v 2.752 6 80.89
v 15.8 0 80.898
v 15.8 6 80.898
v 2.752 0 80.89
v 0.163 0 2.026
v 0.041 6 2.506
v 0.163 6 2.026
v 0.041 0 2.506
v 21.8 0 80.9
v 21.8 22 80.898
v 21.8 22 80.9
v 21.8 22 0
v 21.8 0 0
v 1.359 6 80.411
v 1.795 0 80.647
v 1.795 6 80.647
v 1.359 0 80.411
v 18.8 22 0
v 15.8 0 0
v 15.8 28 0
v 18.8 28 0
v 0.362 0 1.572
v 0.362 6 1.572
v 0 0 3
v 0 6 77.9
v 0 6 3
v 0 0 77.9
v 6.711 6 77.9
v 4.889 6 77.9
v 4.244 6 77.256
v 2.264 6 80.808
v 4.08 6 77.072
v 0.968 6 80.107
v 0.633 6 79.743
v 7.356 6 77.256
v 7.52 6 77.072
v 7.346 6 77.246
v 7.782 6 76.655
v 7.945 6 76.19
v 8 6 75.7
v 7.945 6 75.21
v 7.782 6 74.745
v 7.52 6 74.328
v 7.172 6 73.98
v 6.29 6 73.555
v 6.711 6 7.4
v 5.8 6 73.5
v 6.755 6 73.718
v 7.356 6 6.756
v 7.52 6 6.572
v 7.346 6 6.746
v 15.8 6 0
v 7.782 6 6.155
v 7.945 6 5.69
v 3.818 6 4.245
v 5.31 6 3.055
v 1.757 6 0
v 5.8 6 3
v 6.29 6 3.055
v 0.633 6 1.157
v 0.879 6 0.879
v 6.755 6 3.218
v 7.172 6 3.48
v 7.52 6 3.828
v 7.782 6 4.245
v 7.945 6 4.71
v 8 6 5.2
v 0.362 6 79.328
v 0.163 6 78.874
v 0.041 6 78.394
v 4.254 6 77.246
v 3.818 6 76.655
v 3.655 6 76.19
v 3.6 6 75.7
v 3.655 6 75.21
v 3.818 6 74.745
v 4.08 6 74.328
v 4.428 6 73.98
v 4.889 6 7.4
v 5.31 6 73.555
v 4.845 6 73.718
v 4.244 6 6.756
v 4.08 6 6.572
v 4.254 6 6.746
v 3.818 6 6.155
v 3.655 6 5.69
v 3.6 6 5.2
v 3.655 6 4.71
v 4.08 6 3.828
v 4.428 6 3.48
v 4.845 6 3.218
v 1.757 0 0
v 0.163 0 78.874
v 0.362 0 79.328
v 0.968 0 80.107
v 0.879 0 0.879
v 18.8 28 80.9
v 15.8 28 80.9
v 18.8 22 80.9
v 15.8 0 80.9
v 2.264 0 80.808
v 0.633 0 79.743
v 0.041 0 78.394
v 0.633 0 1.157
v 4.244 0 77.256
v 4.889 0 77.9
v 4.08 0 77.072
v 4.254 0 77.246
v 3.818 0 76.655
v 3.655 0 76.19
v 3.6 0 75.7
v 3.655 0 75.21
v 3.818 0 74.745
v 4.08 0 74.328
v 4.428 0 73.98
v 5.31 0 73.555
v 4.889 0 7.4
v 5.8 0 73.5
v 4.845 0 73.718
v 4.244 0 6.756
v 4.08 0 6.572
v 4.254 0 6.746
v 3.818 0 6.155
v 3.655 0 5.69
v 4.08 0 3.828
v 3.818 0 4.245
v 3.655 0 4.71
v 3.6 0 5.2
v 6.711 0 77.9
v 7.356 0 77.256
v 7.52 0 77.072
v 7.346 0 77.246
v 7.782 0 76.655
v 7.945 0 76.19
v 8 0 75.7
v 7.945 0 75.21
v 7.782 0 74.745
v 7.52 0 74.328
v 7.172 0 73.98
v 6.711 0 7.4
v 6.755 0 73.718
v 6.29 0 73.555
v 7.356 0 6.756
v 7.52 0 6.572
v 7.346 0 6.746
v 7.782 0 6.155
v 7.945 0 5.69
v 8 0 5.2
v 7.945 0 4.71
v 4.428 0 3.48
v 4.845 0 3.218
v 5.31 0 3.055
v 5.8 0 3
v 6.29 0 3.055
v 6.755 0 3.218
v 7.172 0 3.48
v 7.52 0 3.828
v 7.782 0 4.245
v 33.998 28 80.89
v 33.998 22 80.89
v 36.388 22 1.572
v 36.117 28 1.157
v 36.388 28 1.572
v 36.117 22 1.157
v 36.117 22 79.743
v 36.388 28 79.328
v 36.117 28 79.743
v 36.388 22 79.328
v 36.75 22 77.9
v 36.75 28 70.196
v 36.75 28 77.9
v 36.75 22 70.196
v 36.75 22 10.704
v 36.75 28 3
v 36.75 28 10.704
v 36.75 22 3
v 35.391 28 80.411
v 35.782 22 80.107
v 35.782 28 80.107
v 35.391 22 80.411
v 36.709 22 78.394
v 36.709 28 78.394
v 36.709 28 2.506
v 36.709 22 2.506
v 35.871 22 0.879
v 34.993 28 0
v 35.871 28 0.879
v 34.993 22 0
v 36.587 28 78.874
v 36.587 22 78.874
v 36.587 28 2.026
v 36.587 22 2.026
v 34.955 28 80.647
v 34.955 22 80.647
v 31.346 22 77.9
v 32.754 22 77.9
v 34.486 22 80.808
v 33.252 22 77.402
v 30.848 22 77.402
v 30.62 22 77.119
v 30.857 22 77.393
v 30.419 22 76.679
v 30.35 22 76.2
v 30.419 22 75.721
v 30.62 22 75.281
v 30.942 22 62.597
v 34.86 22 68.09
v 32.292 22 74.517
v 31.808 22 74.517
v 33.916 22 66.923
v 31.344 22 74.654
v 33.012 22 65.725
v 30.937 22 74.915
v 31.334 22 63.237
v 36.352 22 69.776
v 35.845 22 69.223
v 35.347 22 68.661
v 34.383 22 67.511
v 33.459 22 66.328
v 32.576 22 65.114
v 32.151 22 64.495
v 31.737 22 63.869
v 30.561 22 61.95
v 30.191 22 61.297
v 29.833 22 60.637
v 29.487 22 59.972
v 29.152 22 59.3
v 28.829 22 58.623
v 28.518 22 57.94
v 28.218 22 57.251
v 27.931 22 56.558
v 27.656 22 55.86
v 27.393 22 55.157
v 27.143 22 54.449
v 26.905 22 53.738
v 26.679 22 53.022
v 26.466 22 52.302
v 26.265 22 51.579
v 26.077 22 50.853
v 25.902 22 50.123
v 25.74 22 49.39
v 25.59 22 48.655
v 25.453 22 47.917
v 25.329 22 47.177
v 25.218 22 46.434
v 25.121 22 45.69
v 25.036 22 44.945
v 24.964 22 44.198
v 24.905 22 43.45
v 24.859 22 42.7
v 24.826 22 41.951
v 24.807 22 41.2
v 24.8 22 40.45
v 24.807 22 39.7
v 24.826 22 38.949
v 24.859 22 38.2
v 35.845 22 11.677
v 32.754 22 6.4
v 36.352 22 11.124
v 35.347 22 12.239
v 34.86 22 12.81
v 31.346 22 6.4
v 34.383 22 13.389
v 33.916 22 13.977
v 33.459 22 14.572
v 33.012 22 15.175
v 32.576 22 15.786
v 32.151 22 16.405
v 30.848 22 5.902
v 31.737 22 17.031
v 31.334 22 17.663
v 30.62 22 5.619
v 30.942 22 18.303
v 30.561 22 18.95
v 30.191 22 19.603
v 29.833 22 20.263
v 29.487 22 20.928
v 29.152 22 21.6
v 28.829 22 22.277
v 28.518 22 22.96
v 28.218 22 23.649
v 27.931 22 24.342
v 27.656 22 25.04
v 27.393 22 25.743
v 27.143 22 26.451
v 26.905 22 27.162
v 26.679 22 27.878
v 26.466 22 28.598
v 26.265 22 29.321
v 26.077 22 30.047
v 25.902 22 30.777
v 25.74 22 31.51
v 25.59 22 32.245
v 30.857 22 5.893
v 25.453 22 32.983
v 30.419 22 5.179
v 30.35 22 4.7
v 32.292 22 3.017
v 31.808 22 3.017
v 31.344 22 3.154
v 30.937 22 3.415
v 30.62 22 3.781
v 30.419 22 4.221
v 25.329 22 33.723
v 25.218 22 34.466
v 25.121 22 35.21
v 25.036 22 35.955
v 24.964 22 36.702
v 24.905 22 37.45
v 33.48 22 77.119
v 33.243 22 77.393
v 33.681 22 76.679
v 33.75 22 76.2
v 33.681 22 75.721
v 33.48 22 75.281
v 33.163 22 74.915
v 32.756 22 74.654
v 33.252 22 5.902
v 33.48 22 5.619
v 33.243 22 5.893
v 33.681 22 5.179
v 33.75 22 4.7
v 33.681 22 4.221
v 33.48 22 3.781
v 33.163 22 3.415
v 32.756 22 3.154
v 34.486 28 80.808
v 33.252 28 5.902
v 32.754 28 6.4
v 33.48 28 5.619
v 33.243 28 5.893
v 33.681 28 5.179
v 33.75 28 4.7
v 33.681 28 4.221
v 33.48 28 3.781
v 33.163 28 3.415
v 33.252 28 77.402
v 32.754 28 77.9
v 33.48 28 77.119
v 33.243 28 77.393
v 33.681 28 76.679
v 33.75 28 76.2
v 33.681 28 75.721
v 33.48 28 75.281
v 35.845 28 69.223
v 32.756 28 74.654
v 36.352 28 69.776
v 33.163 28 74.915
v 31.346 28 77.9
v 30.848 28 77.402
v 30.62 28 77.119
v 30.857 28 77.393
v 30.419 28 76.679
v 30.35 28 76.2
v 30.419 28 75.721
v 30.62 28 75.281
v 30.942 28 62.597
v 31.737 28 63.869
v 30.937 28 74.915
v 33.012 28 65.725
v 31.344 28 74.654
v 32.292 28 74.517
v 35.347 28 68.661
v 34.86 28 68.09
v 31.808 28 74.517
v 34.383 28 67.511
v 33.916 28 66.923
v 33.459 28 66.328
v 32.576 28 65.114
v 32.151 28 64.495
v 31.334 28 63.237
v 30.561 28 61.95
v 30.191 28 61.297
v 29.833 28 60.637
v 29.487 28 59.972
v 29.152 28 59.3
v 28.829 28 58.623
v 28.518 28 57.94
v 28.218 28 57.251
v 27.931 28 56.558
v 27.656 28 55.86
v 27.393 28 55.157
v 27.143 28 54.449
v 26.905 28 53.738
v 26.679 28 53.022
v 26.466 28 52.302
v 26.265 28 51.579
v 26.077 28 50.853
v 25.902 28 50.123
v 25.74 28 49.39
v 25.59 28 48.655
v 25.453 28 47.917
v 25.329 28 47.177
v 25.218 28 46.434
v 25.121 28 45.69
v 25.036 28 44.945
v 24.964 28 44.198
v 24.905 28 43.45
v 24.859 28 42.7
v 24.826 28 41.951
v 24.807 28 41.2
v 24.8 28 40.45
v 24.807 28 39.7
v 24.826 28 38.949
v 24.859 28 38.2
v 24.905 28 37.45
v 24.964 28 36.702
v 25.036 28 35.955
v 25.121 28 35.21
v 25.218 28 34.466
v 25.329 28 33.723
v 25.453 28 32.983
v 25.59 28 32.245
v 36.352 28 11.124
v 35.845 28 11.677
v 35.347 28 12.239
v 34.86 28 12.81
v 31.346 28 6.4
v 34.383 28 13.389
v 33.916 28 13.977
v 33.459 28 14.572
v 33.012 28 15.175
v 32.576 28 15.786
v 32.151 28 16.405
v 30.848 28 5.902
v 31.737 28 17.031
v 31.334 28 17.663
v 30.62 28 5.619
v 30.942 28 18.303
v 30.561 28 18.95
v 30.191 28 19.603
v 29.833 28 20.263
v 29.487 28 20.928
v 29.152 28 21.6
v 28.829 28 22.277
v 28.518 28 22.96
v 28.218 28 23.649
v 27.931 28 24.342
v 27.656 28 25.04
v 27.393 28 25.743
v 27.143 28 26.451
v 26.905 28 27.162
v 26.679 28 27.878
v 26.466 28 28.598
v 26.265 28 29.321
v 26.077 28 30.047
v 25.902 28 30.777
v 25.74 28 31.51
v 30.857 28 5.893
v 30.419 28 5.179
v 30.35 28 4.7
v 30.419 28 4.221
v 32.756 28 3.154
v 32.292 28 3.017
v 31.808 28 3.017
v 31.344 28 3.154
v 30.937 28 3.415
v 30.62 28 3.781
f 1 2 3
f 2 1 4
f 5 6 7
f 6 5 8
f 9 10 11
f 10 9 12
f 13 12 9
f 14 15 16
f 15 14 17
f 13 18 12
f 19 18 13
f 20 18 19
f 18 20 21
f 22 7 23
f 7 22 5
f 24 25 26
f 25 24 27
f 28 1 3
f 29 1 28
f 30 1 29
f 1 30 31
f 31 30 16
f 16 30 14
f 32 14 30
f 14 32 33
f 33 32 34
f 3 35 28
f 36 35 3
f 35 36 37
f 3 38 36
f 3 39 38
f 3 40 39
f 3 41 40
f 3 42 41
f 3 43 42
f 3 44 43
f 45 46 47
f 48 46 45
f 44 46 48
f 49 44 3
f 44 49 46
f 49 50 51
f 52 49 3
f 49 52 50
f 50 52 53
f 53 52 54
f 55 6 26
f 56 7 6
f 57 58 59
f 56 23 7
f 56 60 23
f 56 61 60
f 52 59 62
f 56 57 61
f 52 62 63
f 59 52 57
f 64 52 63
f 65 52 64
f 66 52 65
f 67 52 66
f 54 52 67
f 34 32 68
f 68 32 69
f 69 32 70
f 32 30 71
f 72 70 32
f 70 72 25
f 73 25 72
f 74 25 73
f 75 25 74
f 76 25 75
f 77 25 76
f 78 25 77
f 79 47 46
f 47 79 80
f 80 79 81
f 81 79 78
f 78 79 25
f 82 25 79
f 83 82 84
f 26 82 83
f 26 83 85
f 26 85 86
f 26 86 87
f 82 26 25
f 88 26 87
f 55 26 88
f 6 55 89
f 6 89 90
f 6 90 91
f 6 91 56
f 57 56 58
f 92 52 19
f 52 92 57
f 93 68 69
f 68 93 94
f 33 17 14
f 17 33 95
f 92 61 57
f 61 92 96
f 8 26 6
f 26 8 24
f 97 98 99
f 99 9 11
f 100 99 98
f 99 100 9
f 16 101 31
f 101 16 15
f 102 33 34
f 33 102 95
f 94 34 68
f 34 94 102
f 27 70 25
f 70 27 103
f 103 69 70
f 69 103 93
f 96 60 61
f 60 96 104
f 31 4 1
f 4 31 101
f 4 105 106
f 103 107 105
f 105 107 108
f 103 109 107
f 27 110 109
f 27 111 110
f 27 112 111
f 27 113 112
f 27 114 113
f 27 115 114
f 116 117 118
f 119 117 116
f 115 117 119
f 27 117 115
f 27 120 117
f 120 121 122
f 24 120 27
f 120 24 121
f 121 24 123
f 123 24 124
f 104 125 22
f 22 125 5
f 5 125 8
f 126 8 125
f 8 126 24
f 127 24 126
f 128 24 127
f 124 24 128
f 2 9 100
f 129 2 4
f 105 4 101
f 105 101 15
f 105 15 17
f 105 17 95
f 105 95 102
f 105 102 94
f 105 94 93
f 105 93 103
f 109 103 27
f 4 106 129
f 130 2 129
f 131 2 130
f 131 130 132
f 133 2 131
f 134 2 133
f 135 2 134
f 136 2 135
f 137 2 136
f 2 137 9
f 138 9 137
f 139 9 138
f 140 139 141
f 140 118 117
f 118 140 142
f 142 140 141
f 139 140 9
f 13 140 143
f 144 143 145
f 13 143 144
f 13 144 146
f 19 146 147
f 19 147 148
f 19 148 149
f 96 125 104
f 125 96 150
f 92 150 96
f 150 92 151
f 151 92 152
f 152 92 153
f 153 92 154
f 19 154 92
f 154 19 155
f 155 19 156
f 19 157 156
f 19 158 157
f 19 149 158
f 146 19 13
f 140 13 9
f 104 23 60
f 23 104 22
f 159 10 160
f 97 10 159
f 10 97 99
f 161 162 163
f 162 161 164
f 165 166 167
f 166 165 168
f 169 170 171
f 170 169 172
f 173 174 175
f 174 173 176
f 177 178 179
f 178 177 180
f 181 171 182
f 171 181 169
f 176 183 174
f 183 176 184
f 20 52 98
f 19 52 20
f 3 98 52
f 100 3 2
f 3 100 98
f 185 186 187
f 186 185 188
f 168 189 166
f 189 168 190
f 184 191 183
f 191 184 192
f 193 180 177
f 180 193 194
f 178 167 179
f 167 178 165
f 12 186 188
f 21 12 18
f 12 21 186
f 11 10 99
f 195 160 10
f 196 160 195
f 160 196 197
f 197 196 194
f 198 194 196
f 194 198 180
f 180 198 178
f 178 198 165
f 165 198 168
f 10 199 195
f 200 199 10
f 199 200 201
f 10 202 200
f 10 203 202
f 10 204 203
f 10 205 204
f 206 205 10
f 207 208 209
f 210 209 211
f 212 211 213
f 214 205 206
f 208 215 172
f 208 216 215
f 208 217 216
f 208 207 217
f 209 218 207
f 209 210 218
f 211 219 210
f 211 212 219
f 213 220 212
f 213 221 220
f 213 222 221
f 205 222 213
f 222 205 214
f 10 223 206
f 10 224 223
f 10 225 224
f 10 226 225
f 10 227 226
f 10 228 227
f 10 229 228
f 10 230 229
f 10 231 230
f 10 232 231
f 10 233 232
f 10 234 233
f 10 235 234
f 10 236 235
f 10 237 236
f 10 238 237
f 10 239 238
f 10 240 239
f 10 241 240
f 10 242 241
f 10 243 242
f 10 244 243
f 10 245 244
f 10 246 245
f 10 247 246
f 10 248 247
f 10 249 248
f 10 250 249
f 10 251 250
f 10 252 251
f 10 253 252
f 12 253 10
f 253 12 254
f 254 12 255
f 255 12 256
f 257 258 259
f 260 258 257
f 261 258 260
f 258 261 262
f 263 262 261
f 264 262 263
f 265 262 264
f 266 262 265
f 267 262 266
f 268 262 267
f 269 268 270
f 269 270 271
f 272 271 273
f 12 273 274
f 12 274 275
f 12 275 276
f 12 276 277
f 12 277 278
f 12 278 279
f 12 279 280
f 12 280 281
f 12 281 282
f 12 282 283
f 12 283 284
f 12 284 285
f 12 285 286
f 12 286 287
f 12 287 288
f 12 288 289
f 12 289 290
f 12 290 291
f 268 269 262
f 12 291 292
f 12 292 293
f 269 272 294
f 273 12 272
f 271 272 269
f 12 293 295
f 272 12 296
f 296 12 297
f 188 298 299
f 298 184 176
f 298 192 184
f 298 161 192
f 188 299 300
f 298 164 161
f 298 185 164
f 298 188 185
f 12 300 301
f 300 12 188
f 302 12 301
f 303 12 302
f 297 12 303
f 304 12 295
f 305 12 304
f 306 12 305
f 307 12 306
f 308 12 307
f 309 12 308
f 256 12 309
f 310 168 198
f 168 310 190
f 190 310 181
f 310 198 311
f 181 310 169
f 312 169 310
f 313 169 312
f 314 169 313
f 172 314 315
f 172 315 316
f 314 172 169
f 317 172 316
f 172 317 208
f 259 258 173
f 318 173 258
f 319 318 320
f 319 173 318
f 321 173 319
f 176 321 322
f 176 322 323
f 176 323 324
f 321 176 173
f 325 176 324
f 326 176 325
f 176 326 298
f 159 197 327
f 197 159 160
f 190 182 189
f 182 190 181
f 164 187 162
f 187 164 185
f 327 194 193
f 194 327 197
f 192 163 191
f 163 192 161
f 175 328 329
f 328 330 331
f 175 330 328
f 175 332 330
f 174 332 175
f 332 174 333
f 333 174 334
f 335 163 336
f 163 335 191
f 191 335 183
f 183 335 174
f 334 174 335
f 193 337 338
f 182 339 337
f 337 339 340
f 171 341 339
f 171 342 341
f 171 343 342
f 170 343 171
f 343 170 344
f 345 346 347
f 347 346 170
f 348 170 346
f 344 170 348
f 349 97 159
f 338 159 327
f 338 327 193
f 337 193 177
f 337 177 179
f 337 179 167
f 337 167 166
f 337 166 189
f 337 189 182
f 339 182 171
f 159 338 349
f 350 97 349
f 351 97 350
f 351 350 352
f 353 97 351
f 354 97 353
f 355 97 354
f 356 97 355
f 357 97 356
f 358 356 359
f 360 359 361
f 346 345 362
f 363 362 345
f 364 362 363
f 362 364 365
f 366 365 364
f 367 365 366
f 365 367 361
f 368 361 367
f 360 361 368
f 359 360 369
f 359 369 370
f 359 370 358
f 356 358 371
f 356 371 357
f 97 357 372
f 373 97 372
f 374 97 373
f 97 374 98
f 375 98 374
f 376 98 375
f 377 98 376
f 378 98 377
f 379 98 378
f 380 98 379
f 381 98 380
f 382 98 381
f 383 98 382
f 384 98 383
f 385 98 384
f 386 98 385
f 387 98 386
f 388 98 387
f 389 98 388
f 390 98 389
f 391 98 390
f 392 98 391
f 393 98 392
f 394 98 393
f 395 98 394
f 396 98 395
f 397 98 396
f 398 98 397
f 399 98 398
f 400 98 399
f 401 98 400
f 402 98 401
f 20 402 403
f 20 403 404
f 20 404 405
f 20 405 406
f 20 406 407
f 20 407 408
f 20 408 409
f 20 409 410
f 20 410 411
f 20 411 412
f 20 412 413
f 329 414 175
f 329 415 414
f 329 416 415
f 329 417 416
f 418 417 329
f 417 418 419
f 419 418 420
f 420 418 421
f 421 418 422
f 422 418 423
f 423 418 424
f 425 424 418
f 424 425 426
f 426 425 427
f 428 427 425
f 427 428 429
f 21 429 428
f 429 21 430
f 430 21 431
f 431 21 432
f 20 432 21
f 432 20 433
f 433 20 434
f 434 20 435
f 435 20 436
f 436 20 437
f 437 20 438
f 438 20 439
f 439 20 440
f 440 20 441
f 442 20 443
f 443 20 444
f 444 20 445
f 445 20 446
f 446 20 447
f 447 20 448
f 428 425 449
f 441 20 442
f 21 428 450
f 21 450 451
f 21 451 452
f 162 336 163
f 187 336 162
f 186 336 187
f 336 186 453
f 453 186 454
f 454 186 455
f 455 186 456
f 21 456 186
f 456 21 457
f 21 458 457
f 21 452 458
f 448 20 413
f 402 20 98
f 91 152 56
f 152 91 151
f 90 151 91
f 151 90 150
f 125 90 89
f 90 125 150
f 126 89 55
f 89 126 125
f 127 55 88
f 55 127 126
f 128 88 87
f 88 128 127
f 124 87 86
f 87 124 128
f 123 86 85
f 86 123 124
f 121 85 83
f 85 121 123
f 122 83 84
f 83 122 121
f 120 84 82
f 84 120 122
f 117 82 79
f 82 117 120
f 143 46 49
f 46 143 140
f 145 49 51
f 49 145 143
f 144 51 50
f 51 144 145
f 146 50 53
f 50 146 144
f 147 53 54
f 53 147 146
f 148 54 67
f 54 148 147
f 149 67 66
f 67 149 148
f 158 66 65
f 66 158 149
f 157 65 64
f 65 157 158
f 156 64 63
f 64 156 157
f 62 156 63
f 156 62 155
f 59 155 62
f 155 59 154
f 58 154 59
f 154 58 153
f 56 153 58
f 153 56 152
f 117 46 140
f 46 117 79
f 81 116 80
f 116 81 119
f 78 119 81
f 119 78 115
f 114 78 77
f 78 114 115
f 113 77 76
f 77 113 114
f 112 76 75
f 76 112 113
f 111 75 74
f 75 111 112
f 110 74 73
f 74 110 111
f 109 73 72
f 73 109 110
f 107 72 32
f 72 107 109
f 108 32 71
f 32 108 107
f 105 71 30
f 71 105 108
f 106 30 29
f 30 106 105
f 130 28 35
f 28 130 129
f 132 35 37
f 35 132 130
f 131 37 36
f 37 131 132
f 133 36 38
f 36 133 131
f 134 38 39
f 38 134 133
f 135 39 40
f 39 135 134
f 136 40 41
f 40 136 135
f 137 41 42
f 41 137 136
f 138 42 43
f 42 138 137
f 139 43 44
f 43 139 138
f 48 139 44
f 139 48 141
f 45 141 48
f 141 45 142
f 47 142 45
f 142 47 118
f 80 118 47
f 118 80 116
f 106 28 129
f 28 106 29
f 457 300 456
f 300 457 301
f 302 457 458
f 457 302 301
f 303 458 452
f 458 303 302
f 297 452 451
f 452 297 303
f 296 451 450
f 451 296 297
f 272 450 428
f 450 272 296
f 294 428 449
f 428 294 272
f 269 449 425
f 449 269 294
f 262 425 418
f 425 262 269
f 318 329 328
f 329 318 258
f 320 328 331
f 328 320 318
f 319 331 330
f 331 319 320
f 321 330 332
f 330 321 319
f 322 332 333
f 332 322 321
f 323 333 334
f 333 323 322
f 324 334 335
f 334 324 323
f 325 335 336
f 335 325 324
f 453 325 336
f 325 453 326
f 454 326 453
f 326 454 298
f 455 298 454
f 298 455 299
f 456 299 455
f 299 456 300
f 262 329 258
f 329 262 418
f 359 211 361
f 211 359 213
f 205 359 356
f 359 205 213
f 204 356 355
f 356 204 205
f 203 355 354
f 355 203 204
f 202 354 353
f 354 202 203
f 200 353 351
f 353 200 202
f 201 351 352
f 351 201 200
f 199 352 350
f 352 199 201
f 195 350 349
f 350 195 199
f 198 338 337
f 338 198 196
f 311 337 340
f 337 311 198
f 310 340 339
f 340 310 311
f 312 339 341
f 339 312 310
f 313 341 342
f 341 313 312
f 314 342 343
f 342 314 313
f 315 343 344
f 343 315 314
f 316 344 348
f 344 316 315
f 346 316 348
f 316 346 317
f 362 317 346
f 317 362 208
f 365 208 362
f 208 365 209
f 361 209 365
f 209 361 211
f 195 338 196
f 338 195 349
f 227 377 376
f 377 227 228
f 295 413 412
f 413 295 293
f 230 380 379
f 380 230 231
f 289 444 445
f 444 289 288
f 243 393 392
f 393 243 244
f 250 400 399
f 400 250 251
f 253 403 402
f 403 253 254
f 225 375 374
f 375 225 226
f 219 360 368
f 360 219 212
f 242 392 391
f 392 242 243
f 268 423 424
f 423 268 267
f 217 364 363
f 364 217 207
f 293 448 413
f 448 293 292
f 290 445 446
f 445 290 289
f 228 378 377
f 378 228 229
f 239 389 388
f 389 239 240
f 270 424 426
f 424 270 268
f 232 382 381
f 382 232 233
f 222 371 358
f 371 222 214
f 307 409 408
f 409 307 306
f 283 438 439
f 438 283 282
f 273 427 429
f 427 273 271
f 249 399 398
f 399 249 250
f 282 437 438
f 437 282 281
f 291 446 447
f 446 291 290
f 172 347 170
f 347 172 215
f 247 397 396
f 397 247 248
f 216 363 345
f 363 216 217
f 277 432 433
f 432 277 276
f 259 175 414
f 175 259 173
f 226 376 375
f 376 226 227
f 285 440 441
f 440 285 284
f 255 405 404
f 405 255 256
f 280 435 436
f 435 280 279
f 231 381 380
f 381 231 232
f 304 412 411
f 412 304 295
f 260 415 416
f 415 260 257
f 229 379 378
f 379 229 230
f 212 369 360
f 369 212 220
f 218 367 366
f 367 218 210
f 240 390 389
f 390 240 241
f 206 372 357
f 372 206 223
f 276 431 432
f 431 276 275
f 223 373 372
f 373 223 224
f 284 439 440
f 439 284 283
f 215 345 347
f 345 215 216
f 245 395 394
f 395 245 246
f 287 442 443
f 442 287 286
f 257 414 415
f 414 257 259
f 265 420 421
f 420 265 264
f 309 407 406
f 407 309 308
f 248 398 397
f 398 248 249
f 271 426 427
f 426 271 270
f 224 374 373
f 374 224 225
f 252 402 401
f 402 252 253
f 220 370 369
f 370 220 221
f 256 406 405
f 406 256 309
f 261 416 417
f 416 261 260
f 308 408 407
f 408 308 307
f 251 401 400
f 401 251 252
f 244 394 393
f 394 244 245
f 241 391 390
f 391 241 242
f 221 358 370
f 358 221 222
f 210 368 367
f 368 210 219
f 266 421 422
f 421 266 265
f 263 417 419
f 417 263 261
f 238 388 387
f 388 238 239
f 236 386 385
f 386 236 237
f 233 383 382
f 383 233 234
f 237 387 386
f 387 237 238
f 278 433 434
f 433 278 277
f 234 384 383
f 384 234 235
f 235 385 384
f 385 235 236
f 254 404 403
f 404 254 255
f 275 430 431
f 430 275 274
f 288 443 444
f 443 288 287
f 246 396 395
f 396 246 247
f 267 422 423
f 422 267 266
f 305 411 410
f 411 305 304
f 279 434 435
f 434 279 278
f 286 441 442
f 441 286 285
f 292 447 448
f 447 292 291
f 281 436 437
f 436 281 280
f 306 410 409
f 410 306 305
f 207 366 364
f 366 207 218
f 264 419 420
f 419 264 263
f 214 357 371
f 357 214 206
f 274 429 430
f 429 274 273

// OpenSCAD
// file: functions.scad
/*******************************************************************

This OpenSCAD code and its rendered 3D model are part of the

	Kühling&Kühling RepRap Industrial 3D Printer


All details, BOM, assembling instructions and latest sources:
	http://kuehlingkuehling.de

Designed and developed by:
	Jonas Kühling <mail@jonaskuehling.de>
	Simon Kühling <mail@simonkuehling.de>

Licensed under:
	Creative Commons Attribution-ShareAlike
	CC BY-SA 3.0
	http://creativecommons.org/licenses/by-sa/3.0/

*******************************************************************/

module teardrop (r=4.5,h=20,alpha=45,teardropcorner=0,fulldrop=0){		// tear drop hole for top-centering
											// use teardropcorner=1 for bottom horizontal corners
	render()
	translate([-h/2,0,0])
		rotate([-270,0+(teardropcorner*180),90])
			difference(){
				linear_extrude(height=h){
					circle(r);
					polygon(points=[[0,0],[r*cos(alpha),r*sin(alpha)],[0,r/sin(alpha)],[-r*cos(alpha),r*sin(alpha)]], paths=[[0,1,2,3]]);
				}
				if(fulldrop==0) 
					translate([0,(r/sin(alpha))/2+r,h/2]) cube([2*r+2,r/sin(alpha),h+2],center=true);
			}
}

//teardrop(4.5,22,fulldrop=true);



module teardropcentering (r=4.5,h=20,alpha=45){				// tear drop hole for top-centering
	centering_offset_factor = 1.1;
	render()
	translate([-h/2,0,0])
		rotate([-270,0,90])
			difference(){
				linear_extrude(height=h){
					circle(r, $fn=24);
					polygon(points=[[0,0],[r*cos(alpha),r*sin(alpha)],[0,r/sin(alpha)],[-r*cos(alpha),r*sin(alpha)]], paths=[[0,1,2,3]]);
				}
				translate([0,(r/sin(alpha))/2+r*centering_offset_factor,h/2]) cube([2*r+2,r/sin(alpha),h+2],center=true);
			}
}

//teardropcentering();



module teardropcentering_half (r=4.5,h=20, bottom=0,alpha=45){				// tear drop hole for top-centering
																// upper half (bottom=0) or bottom half (bottom=1)
	centering_offset_factor = 1.2;
	render()
	translate([-h/2,0,0])
		rotate([-270,0,90])
			difference(){
				linear_extrude(height=h){
					circle(r, $fn=24);
					polygon(points=[[0,0],[r*cos(alpha),r*sin(alpha)],[0,r/sin(alpha)],[-r*cos(alpha),r*sin(alpha)]], paths=[[0,1,2,3]]);
				}
				translate([0,(r/sin(alpha))/2+r*centering_offset_factor,h/2]) cube([2*r+2,r/sin(alpha),h+2],center=true);
				translate([0,-(r*centering_offset_factor)/2-0.5+bottom*(r*centering_offset_factor+1),h/2]) cube([2*r+2,r*centering_offset_factor+1,h+2],center=true);
			}
}

//teardropcentering_half(bottom=0);


module polyhole(d,h){
	n = max(round(2 * d),3);
	cylinder(h = h, r = (d / 2) / cos (180 / n), $fn = n, center=true);
}



module roundcorner(radius,edge_length){
	render()
	translate([0,0,-1])
		difference(){
			translate([-1,-1,0])
				cube(size = [radius+1,radius+1,edge_length+2], center = false);
			translate(v = [radius,radius,-1])
				cylinder(h = edge_length+4, r=radius, center=false,$fs=0.1);
		}
}

//roundcorner(5,5);



module roundcorner_tear(radius,edge_length){
	render()
	difference(){
		translate([-1,-1,-1])
			cube(size = [edge_length+2, radius+1, radius+1], center = false);
		translate([(edge_length+4)/2-2, radius, radius])
			teardrop(radius, edge_length+4,teardropcorner=1);
	}
}

//roundcorner_tear(8,20);


module roundedge_tear(radius){
	render()
	difference(){
		translate([-1,-1,-1])
			cube(size = [radius+1, radius+1, radius+1], center = false);
		translate([radius,radius,radius])
			union(){
				sphere(r=radius, $fs=0.1);
				translate([0,0,-radius])
					cylinder(r1=(radius*sin(45))-(radius-(radius*sin(45))),r2=radius*sin(45),h=(radius-(radius*sin(45))), $fs=0.1);
			}
	}
}

//roundedge_tear(20);



module roundedge(radius){
	render()
	difference(){
		translate([-1,-1,-1])
			cube(size = [radius+1, radius+1, radius+1], center = false);
		translate([radius,radius,radius])
			sphere(r=radius, $fs=0.1);
	}
}

//roundedge(5);


module nut_trap(nut_wrench_size,trap_height,vertical=0, clearance=0.2,center=true){		// M3 wrench size = 5.5
	radius = cornerdiameter(nut_wrench_size+2*clearance) /2;
	rotate([0,vertical*90,0])
		cylinder(h = trap_height, r = radius, center=center, $fn = 6);
}

//nut_trap(5,5,0);

module nut_slot(nut_wrench_size,nut_height, nut_elevation,vertical=0, clearance=0.2){		// M3 wrench size = 5.5
	radius = cornerdiameter(nut_wrench_size+2*clearance) /2;
	slot_height = nut_height+2*clearance;
	slot_width = nut_wrench_size+2*clearance;
	rotate([0,vertical*270,0]){
		cylinder(h = slot_height, r = radius, center=true, $fn = 6);
		translate([0,-slot_width/2,-slot_height/2]) cube([nut_elevation+1,slot_width,slot_height]);
	}
}

//nut_slot(5.5,3,4,1);

function cornerdiameter(wrench_size) =  2* ((wrench_size)/2)/ cos(180/6);
function cornerdiameter_8(wrench_size) =  2* ((wrench_size)/2)/ cos(180/8);
// main file
/*******************************************************************

This OpenSCAD code and its rendered 3D model are part of the

	Kühling&Kühling RepRap Industrial 3D Printer


All details, BOM, assembling instructions and latest sources:
	http://kuehlingkuehling.de

Designed and developed by:
	Jonas Kühling <mail@jonaskuehling.de>
	Simon Kühling <mail@simonkuehling.de>

Licensed under:
	Creative Commons Attribution-ShareAlike
	CC BY-SA 3.0
	http://creativecommons.org/licenses/by-sa/3.0/

*******************************************************************/

include <configuration.scad>

air_heating_mount_body_width = 2*wall;
air_heating_mount_body_height = air_heating_fan_hole_dist+air_heating_fan_screw_dia+2*clearance+2*wall;
air_heating_mount_body_length = frame_width-clearance-frame_enclosure_thickness + air_heating_fan_height + air_heating_mount_body_width;

// RENDER FOR PRINTING
air_heating_mount();


module air_heating_mount(){

	difference(){

		// main body
		union(){
			hull(){
				translate([wall,air_heating_mount_body_width/2,wall])
					rotate([180,0,90])
						teardrop(wall,air_heating_mount_body_width);
				translate([wall,air_heating_mount_body_width/2,air_heating_mount_body_height-wall])
					rotate([180,0,90])
						teardrop(wall,air_heating_mount_body_width);
				translate([frame_width-clearance-frame_enclosure_thickness+air_heating_mount_body_width-wall,0,0])
					cube([wall,air_heating_mount_body_width,air_heating_mount_body_height]);
			}
			translate([0,air_heating_fan_height,0])
				hull(){
					translate([(frame_width-clearance-frame_enclosure_thickness+air_heating_mount_body_width)+2*wall+((air_heating_fan_side-air_heating_fan_hole_dist)/2+air_heating_fan_screw_dia/2+clearance+wall)-wall,air_heating_mount_body_width/2,wall])
						rotate([180,0,90])
							teardrop(wall,air_heating_mount_body_width);
					translate([(frame_width-clearance-frame_enclosure_thickness+air_heating_mount_body_width)+2*wall+((air_heating_fan_side-air_heating_fan_hole_dist)/2+air_heating_fan_screw_dia/2+clearance+wall)-wall,air_heating_mount_body_width/2,air_heating_mount_body_height-wall])
						rotate([180,0,90])
							teardrop(wall,air_heating_mount_body_width);
					translate([frame_width-clearance-frame_enclosure_thickness,0,0])
						cube([wall,air_heating_mount_body_width,air_heating_mount_body_height]);
				}
			translate([frame_width-clearance-frame_enclosure_thickness,0,0])
				cube([air_heating_mount_body_width,air_heating_fan_height,air_heating_mount_body_height]);
		}


		// fan radial clearance
		translate([frame_width-clearance-frame_enclosure_thickness+air_heating_mount_body_width+2*wall+air_heating_fan_side/2,air_heating_fan_height-1,air_heating_mount_body_height/2])
			rotate([-90,0,0])
				cylinder(r=air_heating_fan_side/2+wall,h=air_heating_mount_body_width+2);

		// frame screw holes
		translate([-clearance-frame_enclosure_thickness+frame_width/2,air_heating_mount_body_width/2,wall+clearance+frame_screw_dia/2])
			rotate([0,0,90])
				teardrop(frame_screw_dia/2+clearance,air_heating_mount_body_width+2);
		translate([-clearance-frame_enclosure_thickness+frame_width/2,air_heating_mount_body_width/2,air_heating_mount_body_height-(wall+clearance+frame_screw_dia/2)])
			rotate([0,0,90])
				teardrop(frame_screw_dia/2+clearance,air_heating_mount_body_width+2);

		// fan screw holes
		translate([0,air_heating_fan_height,0]){
			translate([(frame_width-clearance-frame_enclosure_thickness+air_heating_mount_body_width)+2*wall+(air_heating_fan_side-air_heating_fan_hole_dist)/2,air_heating_mount_body_width/2,air_heating_mount_body_height/2-air_heating_fan_hole_dist/2])
				rotate([0,0,90])
					teardrop(air_heating_fan_screw_dia/2+clearance,air_heating_mount_body_width+2);
			translate([(frame_width-clearance-frame_enclosure_thickness+air_heating_mount_body_width)+2*wall+(air_heating_fan_side-air_heating_fan_hole_dist)/2,air_heating_mount_body_width/2,air_heating_mount_body_height/2+air_heating_fan_hole_dist/2])
				rotate([0,0,90])
					teardrop(air_heating_fan_screw_dia/2+clearance,air_heating_mount_body_width+2);
		}
			
	}

}
